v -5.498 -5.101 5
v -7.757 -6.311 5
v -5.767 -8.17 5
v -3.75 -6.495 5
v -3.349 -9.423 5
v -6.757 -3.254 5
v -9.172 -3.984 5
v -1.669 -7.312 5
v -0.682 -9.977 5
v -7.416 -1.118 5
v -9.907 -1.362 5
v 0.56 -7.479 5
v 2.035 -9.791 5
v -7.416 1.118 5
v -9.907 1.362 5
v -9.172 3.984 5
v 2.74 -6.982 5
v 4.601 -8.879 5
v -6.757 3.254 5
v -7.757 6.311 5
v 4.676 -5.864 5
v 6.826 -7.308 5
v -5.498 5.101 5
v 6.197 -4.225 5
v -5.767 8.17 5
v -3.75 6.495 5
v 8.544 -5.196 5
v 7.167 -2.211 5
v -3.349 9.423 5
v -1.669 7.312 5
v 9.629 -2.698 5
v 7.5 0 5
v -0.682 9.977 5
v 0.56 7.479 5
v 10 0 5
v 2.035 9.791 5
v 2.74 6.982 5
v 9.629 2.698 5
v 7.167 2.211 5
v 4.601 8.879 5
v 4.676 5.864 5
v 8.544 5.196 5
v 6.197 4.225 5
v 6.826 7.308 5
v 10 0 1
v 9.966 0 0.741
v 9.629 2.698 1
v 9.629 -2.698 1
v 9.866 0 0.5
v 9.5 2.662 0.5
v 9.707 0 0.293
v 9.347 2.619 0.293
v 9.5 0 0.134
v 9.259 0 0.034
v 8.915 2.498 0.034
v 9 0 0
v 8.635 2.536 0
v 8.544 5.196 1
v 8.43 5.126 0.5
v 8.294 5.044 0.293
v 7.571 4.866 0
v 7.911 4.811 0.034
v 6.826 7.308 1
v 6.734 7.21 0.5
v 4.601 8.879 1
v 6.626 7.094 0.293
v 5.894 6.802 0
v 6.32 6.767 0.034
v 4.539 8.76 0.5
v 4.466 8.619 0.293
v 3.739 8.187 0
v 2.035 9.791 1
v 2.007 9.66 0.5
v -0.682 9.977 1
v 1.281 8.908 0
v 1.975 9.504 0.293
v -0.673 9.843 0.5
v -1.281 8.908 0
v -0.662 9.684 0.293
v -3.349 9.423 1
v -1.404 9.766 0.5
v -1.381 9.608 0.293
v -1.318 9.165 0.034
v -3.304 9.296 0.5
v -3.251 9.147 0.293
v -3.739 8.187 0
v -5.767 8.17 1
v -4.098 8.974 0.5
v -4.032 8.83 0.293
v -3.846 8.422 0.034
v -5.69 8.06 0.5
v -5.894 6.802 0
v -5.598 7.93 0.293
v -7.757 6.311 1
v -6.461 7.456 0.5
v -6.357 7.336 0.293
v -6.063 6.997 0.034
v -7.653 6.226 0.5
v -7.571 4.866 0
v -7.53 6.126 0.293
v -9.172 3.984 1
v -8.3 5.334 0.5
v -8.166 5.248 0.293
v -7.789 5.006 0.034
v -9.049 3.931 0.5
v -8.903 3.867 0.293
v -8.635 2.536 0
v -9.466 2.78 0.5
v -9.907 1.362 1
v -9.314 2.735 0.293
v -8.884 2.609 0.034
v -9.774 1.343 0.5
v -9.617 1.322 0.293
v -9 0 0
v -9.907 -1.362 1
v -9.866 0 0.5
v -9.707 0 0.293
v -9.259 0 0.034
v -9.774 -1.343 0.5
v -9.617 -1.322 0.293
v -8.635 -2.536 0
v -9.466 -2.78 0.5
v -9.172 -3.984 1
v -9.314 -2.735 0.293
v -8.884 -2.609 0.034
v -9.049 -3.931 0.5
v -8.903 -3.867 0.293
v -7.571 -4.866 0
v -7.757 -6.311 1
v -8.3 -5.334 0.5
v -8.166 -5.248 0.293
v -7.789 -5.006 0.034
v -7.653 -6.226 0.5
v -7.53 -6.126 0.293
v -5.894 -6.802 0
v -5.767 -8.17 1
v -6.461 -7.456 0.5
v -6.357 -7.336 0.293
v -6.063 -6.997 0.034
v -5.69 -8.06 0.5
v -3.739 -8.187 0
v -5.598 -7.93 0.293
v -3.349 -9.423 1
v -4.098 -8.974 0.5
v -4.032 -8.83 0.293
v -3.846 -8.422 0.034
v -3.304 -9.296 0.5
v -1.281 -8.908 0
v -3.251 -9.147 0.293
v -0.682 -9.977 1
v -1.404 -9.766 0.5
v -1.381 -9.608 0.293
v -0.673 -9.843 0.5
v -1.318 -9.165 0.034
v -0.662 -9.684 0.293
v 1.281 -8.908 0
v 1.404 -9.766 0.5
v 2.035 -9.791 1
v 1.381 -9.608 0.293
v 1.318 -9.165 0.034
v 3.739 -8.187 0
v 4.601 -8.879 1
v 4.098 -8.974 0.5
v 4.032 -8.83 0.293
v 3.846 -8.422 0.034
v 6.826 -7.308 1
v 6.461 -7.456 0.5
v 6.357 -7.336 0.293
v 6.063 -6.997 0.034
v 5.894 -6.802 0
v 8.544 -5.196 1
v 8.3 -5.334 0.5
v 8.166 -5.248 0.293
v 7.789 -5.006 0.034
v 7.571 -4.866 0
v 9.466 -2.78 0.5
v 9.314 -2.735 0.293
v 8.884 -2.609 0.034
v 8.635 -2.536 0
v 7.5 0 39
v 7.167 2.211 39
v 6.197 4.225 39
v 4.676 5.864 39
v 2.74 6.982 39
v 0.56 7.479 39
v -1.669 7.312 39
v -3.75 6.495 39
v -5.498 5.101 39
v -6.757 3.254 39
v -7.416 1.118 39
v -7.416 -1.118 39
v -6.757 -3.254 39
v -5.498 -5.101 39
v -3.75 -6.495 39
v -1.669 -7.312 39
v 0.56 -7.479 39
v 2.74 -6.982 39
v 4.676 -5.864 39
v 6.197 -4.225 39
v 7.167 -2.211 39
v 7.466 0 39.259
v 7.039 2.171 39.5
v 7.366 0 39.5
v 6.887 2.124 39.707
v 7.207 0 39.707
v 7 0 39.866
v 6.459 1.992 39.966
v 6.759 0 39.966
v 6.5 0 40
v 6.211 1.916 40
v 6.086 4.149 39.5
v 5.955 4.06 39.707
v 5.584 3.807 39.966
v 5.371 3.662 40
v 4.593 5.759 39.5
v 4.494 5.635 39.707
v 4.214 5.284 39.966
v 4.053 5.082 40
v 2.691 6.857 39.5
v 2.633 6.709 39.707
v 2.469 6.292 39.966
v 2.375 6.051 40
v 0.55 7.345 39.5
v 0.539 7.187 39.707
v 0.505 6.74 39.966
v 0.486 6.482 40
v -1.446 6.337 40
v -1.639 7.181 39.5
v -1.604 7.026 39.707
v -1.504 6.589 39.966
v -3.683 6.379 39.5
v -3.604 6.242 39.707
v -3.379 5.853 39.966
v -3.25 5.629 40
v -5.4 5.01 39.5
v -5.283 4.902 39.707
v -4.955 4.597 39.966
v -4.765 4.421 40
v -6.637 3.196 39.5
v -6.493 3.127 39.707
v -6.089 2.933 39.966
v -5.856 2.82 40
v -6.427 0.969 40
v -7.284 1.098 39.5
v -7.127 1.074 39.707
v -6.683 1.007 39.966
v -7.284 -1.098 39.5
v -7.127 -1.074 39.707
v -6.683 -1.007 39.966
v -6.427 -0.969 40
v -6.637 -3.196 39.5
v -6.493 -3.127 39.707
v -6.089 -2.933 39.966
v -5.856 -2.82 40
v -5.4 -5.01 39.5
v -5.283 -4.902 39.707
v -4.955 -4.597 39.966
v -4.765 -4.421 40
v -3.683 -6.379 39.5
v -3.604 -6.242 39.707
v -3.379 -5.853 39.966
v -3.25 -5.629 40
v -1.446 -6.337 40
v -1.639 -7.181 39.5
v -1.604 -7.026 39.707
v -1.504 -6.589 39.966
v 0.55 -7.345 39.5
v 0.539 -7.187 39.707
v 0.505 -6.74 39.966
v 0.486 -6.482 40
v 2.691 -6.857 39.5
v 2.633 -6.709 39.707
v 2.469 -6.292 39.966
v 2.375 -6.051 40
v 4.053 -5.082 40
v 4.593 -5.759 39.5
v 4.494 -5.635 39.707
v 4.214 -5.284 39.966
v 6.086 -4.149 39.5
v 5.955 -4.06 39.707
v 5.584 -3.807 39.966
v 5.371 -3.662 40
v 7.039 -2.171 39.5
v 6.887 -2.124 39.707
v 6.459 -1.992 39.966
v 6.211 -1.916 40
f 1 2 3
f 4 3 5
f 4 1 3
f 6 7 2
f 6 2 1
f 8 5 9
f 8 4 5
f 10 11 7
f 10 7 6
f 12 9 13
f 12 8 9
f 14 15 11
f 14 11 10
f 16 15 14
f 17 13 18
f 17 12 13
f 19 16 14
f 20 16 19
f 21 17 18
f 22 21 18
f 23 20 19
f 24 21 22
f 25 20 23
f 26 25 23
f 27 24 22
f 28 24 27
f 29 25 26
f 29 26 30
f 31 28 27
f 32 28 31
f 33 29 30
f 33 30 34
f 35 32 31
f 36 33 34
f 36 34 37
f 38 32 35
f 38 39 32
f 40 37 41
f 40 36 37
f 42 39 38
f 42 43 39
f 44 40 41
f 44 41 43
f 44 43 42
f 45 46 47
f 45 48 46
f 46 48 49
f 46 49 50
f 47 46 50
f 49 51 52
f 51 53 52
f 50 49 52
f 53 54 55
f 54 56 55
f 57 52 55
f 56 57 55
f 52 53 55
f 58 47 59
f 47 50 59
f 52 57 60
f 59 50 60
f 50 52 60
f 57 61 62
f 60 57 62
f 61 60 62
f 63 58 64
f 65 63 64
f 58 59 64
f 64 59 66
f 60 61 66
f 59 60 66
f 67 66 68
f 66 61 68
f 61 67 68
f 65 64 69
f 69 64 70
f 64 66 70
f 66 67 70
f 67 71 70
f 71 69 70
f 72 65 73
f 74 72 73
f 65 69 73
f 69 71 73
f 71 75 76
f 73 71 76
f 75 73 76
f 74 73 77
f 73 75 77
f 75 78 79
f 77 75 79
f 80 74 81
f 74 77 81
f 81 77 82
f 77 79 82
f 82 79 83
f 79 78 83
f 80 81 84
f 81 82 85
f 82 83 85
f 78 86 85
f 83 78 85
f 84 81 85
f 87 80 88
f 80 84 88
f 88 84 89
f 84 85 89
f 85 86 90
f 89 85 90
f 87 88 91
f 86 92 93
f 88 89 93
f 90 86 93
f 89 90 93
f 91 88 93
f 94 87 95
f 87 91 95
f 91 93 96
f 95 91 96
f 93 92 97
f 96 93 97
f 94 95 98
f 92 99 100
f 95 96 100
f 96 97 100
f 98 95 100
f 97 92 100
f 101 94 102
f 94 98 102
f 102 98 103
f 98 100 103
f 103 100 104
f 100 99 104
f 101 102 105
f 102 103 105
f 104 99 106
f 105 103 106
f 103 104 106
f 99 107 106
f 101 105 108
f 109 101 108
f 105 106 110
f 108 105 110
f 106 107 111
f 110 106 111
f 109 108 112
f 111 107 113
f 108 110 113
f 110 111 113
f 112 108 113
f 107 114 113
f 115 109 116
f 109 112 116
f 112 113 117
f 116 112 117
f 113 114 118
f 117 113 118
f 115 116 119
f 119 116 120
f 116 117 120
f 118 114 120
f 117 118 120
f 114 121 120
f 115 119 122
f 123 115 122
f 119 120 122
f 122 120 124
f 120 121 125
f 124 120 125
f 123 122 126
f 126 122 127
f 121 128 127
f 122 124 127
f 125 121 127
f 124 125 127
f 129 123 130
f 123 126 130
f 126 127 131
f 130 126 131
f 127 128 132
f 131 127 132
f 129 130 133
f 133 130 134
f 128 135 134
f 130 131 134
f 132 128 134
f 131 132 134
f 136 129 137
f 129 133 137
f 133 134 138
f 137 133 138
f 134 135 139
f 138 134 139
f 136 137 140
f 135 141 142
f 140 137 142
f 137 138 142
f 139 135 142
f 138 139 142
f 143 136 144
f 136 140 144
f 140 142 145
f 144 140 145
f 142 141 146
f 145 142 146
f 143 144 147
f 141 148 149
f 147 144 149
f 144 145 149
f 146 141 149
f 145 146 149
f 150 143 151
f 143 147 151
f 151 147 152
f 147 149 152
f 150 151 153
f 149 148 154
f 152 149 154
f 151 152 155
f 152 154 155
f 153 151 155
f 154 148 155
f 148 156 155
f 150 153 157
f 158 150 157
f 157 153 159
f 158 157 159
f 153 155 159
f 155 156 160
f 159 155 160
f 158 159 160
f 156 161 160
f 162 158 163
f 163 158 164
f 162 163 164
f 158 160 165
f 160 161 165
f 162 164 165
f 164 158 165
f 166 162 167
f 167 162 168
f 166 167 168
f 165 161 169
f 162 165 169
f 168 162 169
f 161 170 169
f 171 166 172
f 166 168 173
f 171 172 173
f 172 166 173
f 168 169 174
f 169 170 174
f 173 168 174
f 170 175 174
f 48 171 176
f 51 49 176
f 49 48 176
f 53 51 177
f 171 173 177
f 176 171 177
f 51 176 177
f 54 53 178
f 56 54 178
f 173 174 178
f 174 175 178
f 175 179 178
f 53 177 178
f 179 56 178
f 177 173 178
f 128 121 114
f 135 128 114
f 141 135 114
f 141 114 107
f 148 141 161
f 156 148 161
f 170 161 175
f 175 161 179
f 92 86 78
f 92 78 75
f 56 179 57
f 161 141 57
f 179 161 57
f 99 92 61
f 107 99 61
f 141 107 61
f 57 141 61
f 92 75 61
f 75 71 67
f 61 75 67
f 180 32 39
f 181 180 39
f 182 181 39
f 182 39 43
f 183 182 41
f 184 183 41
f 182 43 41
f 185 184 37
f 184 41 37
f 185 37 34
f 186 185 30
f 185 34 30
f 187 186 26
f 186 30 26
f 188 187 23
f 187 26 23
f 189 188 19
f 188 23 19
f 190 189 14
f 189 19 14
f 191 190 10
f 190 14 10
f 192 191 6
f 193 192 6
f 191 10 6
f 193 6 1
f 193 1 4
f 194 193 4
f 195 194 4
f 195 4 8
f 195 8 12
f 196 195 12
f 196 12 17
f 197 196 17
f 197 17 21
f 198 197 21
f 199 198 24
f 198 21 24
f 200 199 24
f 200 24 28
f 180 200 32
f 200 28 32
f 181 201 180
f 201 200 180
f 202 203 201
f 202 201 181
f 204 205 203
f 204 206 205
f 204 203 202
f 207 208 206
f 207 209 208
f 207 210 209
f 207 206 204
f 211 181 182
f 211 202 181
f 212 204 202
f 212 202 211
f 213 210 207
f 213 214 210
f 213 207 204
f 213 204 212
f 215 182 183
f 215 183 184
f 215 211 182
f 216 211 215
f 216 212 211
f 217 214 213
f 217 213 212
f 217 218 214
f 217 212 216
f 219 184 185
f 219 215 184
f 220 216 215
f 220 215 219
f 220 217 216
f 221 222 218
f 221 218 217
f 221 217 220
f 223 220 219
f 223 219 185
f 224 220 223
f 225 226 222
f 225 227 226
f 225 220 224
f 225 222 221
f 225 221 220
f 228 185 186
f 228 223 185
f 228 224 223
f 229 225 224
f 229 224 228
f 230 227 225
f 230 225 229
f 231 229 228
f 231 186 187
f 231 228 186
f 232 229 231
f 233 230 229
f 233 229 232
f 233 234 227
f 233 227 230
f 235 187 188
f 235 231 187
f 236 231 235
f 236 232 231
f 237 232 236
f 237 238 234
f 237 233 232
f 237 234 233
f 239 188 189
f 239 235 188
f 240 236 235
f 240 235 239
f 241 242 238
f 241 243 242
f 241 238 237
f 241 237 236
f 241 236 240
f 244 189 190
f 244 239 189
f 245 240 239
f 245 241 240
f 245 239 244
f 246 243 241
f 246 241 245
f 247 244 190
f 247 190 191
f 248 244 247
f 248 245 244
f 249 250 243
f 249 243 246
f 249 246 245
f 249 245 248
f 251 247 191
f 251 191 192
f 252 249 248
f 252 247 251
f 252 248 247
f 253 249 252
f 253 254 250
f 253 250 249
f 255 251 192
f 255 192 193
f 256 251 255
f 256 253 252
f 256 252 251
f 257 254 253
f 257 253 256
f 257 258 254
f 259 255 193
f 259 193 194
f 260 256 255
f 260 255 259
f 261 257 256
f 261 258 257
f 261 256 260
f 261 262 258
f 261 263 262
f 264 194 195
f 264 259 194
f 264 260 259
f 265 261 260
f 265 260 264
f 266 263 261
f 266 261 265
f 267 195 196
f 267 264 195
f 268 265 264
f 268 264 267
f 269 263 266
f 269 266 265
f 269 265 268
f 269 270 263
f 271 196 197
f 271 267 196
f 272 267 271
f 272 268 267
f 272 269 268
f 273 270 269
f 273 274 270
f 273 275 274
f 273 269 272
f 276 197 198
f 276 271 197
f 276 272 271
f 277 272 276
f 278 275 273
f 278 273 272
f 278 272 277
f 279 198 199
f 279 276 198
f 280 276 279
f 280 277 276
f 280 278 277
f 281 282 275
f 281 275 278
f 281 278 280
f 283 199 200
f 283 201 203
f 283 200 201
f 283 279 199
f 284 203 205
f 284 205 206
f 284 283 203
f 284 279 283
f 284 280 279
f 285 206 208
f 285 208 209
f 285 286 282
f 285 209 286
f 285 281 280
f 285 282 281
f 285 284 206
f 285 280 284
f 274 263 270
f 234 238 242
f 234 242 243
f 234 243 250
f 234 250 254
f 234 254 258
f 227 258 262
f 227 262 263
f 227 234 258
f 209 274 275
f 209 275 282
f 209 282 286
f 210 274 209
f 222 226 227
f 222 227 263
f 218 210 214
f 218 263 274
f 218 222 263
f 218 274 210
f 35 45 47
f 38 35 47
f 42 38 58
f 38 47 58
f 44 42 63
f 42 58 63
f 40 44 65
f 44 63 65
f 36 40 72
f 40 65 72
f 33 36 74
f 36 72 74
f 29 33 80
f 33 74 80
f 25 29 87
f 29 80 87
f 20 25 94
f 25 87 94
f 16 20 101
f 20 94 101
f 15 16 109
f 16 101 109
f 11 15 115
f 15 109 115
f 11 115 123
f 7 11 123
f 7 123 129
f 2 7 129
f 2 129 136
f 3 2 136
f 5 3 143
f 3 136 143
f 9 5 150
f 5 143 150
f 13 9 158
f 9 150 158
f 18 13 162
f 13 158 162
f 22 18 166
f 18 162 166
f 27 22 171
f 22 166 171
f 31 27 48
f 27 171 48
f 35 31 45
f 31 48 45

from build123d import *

# Parameters (mm, degrees)
F0_R     = 10
F1_DEPTH = 5
F2_R     = 7.5
F3_DEPTH = 35
F4_R     = 1
F5_R     = 1


with BuildPart() as f1:
    # F0 (on Top) → F1 (new body)
    with BuildSketch(Plane.XY):
        Circle(F0_R)
    extrude(amount=F1_DEPTH)

    # F2 (on face) → F3 (join)
    with BuildSketch(Plane.XY.offset(5)):
        Circle(F2_R)
    extrude(amount=F3_DEPTH)

    # F4
    f4_edges = [f1.edges().sort_by_distance(p)[0] for p in [
        (-7.5, 0, 40),
    ]]
    fillet(f4_edges, radius=F4_R)

    # F5
    f5_edges = [f1.edges().sort_by_distance(p)[0] for p in [
        (-10, 0, 0),
    ]]
    fillet(f5_edges, radius=F5_R)


solid = f1.part
